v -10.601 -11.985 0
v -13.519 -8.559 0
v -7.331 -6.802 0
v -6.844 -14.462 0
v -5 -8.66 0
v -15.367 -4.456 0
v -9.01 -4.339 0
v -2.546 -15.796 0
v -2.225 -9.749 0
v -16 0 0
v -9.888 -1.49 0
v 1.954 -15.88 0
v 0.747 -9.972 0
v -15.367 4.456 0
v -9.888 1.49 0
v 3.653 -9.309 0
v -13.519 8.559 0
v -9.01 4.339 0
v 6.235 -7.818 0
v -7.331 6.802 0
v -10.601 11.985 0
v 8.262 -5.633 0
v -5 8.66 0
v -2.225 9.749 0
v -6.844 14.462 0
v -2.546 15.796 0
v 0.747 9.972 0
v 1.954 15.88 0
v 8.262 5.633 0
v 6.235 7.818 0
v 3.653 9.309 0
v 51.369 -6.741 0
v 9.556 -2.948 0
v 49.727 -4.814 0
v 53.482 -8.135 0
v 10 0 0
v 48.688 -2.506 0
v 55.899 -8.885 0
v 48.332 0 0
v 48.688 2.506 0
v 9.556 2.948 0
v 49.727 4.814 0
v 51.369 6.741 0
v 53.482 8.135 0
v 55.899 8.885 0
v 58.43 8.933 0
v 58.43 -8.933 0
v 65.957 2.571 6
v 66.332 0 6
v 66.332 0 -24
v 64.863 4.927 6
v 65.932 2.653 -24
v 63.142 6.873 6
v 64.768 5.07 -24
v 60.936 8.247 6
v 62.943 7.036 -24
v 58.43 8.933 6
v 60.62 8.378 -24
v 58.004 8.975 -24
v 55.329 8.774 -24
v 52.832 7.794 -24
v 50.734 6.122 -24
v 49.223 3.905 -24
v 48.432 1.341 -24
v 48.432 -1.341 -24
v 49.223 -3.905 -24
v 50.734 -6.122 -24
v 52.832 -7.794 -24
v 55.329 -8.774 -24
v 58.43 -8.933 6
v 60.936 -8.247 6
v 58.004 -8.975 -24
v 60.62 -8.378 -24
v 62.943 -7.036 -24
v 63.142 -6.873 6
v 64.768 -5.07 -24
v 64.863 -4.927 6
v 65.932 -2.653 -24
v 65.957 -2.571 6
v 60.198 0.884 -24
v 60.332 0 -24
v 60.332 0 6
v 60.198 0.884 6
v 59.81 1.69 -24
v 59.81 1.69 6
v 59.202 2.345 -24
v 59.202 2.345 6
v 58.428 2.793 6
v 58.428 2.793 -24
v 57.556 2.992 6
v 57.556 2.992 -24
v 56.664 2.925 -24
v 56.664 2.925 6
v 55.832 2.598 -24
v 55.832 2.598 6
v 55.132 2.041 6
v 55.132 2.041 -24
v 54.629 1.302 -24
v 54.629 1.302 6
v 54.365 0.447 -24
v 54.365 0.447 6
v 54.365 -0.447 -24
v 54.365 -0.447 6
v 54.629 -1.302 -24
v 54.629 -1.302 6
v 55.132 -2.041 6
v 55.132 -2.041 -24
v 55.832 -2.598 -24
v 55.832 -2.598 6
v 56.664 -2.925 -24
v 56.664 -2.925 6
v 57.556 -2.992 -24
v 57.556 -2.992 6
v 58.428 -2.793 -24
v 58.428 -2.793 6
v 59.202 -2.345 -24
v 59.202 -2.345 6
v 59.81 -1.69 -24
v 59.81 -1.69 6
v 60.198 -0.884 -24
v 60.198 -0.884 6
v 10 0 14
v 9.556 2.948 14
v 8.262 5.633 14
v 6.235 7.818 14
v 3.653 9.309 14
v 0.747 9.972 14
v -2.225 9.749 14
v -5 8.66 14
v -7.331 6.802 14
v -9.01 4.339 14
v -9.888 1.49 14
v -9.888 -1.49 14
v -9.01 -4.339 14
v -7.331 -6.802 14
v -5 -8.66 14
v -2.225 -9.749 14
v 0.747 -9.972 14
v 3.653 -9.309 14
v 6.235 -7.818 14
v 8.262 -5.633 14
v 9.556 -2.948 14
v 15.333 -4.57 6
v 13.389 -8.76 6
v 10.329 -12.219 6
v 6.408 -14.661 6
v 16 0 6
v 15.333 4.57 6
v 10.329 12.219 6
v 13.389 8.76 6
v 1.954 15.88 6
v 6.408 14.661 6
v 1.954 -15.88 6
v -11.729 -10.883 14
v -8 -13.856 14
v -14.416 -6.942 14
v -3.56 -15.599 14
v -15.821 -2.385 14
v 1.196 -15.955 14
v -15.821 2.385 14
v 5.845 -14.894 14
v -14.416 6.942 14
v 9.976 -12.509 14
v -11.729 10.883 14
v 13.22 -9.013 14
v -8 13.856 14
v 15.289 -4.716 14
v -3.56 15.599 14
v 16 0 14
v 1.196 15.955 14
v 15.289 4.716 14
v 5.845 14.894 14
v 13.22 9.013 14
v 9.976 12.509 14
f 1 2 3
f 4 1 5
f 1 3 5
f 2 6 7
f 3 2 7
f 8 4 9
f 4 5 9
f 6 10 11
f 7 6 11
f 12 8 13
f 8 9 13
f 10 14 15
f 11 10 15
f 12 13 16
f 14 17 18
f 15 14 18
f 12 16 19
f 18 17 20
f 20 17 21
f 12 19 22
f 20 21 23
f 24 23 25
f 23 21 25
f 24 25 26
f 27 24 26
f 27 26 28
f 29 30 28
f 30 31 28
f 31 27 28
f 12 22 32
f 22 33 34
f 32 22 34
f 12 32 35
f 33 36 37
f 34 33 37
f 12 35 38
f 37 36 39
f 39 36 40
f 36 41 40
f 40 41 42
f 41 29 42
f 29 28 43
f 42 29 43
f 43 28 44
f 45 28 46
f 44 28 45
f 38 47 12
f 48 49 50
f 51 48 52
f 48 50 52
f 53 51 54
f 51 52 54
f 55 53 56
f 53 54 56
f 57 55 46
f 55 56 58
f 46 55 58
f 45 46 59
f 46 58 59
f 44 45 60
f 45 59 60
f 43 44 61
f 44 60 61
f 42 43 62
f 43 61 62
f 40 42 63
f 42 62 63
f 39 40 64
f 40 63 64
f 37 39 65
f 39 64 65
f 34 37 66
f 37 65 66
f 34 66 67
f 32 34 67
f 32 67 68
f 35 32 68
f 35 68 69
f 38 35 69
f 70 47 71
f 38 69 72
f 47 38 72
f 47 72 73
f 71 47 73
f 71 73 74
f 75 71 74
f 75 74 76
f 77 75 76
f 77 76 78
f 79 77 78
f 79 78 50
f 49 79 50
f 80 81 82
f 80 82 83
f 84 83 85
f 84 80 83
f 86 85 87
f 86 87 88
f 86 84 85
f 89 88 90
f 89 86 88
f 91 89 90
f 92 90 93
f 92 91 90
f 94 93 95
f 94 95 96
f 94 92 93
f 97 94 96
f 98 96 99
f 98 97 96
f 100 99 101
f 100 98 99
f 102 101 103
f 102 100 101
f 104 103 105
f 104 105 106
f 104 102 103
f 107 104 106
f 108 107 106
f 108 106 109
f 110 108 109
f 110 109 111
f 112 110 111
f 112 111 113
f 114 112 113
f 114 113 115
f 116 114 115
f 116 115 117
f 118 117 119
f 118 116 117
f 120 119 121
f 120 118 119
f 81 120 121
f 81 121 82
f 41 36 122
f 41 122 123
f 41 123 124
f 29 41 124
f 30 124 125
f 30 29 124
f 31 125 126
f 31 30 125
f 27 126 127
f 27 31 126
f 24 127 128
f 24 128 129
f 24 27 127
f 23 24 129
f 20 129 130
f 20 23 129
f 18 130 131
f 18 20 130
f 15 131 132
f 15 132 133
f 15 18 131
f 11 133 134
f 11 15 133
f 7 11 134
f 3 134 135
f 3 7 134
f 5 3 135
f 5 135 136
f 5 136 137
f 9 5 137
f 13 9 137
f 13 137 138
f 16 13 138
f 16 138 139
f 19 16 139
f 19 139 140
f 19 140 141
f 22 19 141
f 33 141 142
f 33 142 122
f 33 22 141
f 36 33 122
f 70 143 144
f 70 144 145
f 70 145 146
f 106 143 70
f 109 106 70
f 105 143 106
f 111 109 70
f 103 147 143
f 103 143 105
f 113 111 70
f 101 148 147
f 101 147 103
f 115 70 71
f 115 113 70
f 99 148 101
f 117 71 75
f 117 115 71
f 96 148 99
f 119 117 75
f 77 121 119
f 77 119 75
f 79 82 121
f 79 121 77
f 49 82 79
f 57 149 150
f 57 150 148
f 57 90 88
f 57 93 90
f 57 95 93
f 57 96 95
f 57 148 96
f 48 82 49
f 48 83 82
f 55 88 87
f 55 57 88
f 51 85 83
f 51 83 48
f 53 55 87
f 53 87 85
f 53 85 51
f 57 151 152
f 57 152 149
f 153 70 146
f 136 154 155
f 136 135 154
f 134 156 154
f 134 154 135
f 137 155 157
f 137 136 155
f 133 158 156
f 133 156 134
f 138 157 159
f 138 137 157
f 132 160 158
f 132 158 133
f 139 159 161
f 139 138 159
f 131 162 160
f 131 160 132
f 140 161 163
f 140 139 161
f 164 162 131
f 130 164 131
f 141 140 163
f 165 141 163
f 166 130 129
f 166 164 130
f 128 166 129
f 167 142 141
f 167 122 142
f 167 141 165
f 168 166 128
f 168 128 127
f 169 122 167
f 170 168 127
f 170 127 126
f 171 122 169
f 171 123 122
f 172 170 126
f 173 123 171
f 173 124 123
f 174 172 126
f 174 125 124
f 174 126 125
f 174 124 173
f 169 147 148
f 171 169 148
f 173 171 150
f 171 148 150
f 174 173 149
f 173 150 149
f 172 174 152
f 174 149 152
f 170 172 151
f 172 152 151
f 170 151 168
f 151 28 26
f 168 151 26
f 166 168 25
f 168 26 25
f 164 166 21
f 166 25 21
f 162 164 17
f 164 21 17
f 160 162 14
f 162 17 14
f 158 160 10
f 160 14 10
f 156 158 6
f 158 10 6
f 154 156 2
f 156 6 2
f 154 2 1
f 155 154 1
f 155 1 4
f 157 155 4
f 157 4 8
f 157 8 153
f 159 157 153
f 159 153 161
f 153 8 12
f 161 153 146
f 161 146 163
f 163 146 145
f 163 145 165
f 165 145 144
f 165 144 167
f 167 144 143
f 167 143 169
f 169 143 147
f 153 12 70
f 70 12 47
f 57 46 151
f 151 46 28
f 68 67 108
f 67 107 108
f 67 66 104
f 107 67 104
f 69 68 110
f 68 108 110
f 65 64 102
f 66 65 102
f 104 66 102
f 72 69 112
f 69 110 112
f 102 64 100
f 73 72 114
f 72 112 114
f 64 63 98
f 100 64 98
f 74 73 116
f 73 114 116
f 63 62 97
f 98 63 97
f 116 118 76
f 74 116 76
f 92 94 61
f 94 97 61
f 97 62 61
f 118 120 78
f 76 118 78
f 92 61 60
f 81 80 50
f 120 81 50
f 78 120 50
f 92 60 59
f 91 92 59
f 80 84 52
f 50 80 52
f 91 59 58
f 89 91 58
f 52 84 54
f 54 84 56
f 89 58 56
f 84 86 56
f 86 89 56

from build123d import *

# Parameters (mm, degrees)
SKETCH3_R                = 10
BOSS_EXTRUDE4_DEPTH      = 14
BOSS_EXTRUDE5_DEPTH      = 6
BOSS_EXTRUDE6_DEPTH      = 6
BOSS_EXTRUDE6_DEPTH_BACK = 24
SKETCH3_4_R              = 3


with BuildPart() as part:
    # Sketch3 → Boss-Extrude4 (new body)
    with BuildSketch(Plane.XY):
        with BuildLine():
            ThreePointArc((16, 0), (11.984506309, 10.600547558), (1.953548933, 15.880291136))
            ThreePointArc((1.953548933, 15.880291136), (-16, 0), (1.953548933, -15.880291136))
            ThreePointArc((1.953548933, -15.880291136), (11.984506309, -10.600547558), (16, 0))
        make_face()
        Circle(SKETCH3_R, mode=Mode.SUBTRACT)
    extrude(amount=BOSS_EXTRUDE4_DEPTH)

    # Sketch3<3> → Boss-Extrude5 (add)
    with BuildSketch(Plane.XY):
        with BuildLine():
            ThreePointArc((58.430427234, -8.932663764), (48.331555959, 0), (58.430427234, 8.932663764))
            Line((58.430427234, 8.932663764), (1.953548933, 15.880291136))
            ThreePointArc((1.953548933, 15.880291136), (11.984506309, 10.600547558), (16, 0))
            ThreePointArc((16, 0), (11.984506309, -10.600547558), (1.953548933, -15.880291136))
            Line((1.953548933, -15.880291136), (58.430427234, -8.932663764))
        make_face()
    extrude(amount=BOSS_EXTRUDE5_DEPTH)

    # Sketch3<4> → Boss-Extrude6 (add, two sides: drawn at the far end of the back side and taken through both)
    with BuildSketch(Plane.XY.offset(-BOSS_EXTRUDE6_DEPTH_BACK)):
        with BuildLine():
            ThreePointArc((66.331555959, 0), (64.072840758, 5.962808001), (58.430427234, 8.932663764))
            ThreePointArc((58.430427234, 8.932663764), (48.331555959, 0), (58.430427234, -8.932663764))
            ThreePointArc((58.430427234, -8.932663764), (64.072840758, -5.962808001), (66.331555959, 0))
        make_face()
        with Locations((57.331555959, 0)):
            Circle(SKETCH3_4_R, mode=Mode.SUBTRACT)
    extrude(amount=BOSS_EXTRUDE6_DEPTH + BOSS_EXTRUDE6_DEPTH_BACK)


solid = part.part
